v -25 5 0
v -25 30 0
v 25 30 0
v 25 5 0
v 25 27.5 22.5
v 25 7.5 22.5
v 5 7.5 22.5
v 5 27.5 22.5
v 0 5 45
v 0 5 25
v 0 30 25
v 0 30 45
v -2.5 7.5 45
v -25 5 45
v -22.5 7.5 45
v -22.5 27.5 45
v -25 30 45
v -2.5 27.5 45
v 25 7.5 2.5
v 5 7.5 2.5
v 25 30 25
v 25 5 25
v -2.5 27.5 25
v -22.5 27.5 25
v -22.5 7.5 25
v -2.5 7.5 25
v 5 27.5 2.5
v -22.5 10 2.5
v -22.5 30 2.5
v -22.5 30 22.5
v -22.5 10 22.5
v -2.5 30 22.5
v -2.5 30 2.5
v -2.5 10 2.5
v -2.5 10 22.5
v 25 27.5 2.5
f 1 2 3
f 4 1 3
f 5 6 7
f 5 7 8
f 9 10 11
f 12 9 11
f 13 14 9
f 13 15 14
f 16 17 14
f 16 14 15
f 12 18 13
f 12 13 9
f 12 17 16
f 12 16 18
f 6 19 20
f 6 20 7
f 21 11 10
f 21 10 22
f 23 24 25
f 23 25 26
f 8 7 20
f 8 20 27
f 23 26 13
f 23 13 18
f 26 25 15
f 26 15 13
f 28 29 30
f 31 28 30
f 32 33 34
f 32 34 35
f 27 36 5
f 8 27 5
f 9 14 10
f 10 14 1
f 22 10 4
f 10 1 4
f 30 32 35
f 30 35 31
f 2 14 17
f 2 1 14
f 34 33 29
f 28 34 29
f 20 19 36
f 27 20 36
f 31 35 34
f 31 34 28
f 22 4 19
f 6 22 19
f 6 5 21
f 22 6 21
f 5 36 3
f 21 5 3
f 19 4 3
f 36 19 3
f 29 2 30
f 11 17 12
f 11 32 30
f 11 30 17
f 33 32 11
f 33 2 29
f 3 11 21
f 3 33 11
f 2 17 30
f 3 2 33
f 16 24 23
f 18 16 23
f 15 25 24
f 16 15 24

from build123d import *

# Parameters (mm, degrees)
F0_W     = 25
F0_H     = 20
F0_H_2   = 5
F0_W_2   = 20
F0_H_3   = 25
F1_DEPTH = 25
F2_W     = 20
F2_H     = 20
F3_DEPTH = 20
F4_W     = 20
F4_H     = 20
F5_DEPTH = 20
F6_W     = 25
F6_H     = 25
F6_W_2   = 20
F6_H_2   = 20
F7_DEPTH = 20


with BuildPart() as f1:
    # F0 (on Top) → F1 (new body)
    with BuildSketch(Plane.XY):
        with Locations((-12.5, 20)):
            Rectangle(F0_W, F0_H)
        Polygon((5, 30), (0, 30), (0, 10), (0, 5), (5, 5), align=None)
        with Locations((-12.5, 7.5)):
            Rectangle(F0_W, F0_H_2)
        with Locations((15, 17.5)):
            Rectangle(F0_W_2, F0_H_3)
    extrude(amount=F1_DEPTH)

    # F2 (on face) → F3 (cut)
    with BuildSketch(Plane(origin=(0, 30, 0), x_dir=(-1, 0, 0), z_dir=(0, 1, 0))):
        with Locations((12.5, 12.5)):
            Rectangle(F2_W, F2_H)
    extrude(amount=-F3_DEPTH, mode=Mode.SUBTRACT)

    # F4 (on face) → F5 (cut)
    with BuildSketch(Plane.YZ.offset(25)):
        with Locations((17.5, 12.5)):
            Rectangle(F4_W, F4_H)
    extrude(amount=-F5_DEPTH, mode=Mode.SUBTRACT)

    # F6 (on face) → F7 (join)
    with BuildSketch(Plane.XY.offset(25)):
        with Locations((-12.5, 17.5)):
            Rectangle(F6_W, F6_H)
        with Locations((-12.5, 17.5)):
            Rectangle(F6_W_2, F6_H_2, mode=Mode.SUBTRACT)
    extrude(amount=F7_DEPTH)


solid = f1.part
